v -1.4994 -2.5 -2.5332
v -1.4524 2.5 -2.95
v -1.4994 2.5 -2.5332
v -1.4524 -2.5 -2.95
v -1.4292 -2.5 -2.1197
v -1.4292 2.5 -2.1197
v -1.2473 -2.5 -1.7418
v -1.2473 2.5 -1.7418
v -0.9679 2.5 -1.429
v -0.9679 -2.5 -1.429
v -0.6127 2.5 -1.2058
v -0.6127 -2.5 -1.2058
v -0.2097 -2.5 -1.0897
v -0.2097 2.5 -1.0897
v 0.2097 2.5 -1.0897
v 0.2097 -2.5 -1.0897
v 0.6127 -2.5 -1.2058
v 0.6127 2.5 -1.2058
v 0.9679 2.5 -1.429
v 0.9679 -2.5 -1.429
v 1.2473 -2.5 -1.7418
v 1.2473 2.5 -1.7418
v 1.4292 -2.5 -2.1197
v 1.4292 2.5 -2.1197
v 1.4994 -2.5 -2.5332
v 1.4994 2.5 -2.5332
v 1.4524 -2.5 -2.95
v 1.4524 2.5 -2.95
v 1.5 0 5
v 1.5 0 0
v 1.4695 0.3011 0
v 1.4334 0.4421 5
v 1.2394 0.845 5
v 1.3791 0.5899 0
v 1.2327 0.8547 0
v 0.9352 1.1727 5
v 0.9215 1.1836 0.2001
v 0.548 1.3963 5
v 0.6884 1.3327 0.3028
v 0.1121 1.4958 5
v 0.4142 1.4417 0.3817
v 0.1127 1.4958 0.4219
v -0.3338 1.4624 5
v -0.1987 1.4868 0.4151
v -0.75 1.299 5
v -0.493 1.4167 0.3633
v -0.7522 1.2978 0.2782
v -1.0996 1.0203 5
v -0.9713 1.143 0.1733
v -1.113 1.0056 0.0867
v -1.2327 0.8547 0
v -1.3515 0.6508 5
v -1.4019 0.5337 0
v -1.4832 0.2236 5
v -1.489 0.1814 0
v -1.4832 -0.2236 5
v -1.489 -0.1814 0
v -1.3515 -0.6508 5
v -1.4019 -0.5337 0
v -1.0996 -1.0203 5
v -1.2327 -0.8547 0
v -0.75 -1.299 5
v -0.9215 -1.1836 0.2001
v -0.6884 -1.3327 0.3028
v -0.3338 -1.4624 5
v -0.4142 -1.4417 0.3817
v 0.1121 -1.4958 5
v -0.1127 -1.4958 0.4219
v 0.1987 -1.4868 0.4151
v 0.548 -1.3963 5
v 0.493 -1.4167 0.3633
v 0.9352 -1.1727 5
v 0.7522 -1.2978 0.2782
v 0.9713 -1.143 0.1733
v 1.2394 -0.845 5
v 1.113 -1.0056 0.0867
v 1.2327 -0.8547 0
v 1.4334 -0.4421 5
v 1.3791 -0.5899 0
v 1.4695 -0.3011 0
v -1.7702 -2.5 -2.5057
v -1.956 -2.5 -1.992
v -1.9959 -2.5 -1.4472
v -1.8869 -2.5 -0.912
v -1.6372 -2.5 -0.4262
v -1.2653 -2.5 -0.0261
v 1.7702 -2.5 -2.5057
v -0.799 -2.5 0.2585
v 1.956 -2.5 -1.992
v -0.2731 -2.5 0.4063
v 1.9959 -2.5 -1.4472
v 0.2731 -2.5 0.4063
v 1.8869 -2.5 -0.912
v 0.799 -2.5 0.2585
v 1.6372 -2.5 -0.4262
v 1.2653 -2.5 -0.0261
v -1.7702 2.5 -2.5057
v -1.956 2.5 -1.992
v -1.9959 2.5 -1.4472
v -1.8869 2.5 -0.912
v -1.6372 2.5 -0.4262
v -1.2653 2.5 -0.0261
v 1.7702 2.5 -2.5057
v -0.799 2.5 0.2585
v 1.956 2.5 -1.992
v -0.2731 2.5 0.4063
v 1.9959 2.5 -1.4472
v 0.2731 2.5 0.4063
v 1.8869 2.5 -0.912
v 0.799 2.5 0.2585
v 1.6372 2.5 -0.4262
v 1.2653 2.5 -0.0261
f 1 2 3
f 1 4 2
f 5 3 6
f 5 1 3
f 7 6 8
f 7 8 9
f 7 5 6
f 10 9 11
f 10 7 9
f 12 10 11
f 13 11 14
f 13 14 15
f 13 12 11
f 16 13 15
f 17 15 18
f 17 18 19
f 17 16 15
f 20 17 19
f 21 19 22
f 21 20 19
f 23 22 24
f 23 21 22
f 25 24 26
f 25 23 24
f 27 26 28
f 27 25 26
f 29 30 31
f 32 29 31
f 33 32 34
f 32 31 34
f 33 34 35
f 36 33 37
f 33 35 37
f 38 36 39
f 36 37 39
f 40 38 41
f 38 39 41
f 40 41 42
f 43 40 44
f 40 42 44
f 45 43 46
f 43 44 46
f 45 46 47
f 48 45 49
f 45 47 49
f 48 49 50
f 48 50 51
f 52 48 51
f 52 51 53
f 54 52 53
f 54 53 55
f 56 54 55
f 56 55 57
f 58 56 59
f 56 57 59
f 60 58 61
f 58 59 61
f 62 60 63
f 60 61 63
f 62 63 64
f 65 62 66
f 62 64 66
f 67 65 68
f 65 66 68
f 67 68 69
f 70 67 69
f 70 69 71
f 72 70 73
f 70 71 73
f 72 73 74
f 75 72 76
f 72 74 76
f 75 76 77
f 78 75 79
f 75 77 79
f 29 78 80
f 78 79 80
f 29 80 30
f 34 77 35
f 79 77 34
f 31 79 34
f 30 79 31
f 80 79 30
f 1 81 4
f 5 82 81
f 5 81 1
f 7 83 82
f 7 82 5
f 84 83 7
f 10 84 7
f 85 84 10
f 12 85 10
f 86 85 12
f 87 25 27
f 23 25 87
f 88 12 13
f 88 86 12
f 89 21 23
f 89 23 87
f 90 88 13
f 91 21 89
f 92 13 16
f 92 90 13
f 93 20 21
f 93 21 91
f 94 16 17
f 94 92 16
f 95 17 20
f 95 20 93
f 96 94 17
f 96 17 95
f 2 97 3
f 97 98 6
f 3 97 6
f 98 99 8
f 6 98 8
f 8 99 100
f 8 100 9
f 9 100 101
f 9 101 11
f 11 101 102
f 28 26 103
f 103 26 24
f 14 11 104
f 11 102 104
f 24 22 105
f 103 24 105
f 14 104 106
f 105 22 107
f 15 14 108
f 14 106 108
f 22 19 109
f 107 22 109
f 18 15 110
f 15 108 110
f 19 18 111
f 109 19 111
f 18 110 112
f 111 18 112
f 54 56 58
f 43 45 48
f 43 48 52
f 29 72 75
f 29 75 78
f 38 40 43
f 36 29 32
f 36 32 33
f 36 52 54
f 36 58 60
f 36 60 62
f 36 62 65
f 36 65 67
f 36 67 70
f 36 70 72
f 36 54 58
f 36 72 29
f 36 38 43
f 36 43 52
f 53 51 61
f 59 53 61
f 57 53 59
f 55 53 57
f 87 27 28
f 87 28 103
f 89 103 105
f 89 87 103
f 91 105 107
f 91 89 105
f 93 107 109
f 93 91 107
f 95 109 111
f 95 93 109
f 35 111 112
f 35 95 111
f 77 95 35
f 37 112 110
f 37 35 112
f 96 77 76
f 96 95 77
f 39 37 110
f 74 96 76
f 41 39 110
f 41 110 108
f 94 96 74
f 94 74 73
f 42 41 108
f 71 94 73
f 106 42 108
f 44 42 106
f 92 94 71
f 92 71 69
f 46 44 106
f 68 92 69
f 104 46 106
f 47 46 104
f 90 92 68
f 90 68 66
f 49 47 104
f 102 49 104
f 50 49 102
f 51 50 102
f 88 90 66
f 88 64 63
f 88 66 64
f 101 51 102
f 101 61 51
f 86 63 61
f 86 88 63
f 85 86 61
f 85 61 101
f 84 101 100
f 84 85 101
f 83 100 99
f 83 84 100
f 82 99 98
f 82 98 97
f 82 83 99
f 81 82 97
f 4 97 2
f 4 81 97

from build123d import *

# Parameters (mm, degrees)
F1_DEPTH = 2.5
F2_R     = 1.5
F3_DEPTH = 5


with BuildPart() as f1:
    # F0 (on Front) → F1 (new body, symmetric)
    with BuildSketch(Plane.XZ):
        with BuildLine():
            ThreePointArc((-1.452369, -2.94996), (0, -1.07496), (1.452369, -2.94996))
            ThreePointArc((1.452369, -2.94996), (0, 0.42504), (-1.452369, -2.94996))
        make_face()
    extrude(amount=F1_DEPTH, both=True)

    # F2 (on Top) → F3 (join)
    with BuildSketch(Plane.XY):
        Circle(F2_R)
    extrude(amount=F3_DEPTH)


solid = f1.part
